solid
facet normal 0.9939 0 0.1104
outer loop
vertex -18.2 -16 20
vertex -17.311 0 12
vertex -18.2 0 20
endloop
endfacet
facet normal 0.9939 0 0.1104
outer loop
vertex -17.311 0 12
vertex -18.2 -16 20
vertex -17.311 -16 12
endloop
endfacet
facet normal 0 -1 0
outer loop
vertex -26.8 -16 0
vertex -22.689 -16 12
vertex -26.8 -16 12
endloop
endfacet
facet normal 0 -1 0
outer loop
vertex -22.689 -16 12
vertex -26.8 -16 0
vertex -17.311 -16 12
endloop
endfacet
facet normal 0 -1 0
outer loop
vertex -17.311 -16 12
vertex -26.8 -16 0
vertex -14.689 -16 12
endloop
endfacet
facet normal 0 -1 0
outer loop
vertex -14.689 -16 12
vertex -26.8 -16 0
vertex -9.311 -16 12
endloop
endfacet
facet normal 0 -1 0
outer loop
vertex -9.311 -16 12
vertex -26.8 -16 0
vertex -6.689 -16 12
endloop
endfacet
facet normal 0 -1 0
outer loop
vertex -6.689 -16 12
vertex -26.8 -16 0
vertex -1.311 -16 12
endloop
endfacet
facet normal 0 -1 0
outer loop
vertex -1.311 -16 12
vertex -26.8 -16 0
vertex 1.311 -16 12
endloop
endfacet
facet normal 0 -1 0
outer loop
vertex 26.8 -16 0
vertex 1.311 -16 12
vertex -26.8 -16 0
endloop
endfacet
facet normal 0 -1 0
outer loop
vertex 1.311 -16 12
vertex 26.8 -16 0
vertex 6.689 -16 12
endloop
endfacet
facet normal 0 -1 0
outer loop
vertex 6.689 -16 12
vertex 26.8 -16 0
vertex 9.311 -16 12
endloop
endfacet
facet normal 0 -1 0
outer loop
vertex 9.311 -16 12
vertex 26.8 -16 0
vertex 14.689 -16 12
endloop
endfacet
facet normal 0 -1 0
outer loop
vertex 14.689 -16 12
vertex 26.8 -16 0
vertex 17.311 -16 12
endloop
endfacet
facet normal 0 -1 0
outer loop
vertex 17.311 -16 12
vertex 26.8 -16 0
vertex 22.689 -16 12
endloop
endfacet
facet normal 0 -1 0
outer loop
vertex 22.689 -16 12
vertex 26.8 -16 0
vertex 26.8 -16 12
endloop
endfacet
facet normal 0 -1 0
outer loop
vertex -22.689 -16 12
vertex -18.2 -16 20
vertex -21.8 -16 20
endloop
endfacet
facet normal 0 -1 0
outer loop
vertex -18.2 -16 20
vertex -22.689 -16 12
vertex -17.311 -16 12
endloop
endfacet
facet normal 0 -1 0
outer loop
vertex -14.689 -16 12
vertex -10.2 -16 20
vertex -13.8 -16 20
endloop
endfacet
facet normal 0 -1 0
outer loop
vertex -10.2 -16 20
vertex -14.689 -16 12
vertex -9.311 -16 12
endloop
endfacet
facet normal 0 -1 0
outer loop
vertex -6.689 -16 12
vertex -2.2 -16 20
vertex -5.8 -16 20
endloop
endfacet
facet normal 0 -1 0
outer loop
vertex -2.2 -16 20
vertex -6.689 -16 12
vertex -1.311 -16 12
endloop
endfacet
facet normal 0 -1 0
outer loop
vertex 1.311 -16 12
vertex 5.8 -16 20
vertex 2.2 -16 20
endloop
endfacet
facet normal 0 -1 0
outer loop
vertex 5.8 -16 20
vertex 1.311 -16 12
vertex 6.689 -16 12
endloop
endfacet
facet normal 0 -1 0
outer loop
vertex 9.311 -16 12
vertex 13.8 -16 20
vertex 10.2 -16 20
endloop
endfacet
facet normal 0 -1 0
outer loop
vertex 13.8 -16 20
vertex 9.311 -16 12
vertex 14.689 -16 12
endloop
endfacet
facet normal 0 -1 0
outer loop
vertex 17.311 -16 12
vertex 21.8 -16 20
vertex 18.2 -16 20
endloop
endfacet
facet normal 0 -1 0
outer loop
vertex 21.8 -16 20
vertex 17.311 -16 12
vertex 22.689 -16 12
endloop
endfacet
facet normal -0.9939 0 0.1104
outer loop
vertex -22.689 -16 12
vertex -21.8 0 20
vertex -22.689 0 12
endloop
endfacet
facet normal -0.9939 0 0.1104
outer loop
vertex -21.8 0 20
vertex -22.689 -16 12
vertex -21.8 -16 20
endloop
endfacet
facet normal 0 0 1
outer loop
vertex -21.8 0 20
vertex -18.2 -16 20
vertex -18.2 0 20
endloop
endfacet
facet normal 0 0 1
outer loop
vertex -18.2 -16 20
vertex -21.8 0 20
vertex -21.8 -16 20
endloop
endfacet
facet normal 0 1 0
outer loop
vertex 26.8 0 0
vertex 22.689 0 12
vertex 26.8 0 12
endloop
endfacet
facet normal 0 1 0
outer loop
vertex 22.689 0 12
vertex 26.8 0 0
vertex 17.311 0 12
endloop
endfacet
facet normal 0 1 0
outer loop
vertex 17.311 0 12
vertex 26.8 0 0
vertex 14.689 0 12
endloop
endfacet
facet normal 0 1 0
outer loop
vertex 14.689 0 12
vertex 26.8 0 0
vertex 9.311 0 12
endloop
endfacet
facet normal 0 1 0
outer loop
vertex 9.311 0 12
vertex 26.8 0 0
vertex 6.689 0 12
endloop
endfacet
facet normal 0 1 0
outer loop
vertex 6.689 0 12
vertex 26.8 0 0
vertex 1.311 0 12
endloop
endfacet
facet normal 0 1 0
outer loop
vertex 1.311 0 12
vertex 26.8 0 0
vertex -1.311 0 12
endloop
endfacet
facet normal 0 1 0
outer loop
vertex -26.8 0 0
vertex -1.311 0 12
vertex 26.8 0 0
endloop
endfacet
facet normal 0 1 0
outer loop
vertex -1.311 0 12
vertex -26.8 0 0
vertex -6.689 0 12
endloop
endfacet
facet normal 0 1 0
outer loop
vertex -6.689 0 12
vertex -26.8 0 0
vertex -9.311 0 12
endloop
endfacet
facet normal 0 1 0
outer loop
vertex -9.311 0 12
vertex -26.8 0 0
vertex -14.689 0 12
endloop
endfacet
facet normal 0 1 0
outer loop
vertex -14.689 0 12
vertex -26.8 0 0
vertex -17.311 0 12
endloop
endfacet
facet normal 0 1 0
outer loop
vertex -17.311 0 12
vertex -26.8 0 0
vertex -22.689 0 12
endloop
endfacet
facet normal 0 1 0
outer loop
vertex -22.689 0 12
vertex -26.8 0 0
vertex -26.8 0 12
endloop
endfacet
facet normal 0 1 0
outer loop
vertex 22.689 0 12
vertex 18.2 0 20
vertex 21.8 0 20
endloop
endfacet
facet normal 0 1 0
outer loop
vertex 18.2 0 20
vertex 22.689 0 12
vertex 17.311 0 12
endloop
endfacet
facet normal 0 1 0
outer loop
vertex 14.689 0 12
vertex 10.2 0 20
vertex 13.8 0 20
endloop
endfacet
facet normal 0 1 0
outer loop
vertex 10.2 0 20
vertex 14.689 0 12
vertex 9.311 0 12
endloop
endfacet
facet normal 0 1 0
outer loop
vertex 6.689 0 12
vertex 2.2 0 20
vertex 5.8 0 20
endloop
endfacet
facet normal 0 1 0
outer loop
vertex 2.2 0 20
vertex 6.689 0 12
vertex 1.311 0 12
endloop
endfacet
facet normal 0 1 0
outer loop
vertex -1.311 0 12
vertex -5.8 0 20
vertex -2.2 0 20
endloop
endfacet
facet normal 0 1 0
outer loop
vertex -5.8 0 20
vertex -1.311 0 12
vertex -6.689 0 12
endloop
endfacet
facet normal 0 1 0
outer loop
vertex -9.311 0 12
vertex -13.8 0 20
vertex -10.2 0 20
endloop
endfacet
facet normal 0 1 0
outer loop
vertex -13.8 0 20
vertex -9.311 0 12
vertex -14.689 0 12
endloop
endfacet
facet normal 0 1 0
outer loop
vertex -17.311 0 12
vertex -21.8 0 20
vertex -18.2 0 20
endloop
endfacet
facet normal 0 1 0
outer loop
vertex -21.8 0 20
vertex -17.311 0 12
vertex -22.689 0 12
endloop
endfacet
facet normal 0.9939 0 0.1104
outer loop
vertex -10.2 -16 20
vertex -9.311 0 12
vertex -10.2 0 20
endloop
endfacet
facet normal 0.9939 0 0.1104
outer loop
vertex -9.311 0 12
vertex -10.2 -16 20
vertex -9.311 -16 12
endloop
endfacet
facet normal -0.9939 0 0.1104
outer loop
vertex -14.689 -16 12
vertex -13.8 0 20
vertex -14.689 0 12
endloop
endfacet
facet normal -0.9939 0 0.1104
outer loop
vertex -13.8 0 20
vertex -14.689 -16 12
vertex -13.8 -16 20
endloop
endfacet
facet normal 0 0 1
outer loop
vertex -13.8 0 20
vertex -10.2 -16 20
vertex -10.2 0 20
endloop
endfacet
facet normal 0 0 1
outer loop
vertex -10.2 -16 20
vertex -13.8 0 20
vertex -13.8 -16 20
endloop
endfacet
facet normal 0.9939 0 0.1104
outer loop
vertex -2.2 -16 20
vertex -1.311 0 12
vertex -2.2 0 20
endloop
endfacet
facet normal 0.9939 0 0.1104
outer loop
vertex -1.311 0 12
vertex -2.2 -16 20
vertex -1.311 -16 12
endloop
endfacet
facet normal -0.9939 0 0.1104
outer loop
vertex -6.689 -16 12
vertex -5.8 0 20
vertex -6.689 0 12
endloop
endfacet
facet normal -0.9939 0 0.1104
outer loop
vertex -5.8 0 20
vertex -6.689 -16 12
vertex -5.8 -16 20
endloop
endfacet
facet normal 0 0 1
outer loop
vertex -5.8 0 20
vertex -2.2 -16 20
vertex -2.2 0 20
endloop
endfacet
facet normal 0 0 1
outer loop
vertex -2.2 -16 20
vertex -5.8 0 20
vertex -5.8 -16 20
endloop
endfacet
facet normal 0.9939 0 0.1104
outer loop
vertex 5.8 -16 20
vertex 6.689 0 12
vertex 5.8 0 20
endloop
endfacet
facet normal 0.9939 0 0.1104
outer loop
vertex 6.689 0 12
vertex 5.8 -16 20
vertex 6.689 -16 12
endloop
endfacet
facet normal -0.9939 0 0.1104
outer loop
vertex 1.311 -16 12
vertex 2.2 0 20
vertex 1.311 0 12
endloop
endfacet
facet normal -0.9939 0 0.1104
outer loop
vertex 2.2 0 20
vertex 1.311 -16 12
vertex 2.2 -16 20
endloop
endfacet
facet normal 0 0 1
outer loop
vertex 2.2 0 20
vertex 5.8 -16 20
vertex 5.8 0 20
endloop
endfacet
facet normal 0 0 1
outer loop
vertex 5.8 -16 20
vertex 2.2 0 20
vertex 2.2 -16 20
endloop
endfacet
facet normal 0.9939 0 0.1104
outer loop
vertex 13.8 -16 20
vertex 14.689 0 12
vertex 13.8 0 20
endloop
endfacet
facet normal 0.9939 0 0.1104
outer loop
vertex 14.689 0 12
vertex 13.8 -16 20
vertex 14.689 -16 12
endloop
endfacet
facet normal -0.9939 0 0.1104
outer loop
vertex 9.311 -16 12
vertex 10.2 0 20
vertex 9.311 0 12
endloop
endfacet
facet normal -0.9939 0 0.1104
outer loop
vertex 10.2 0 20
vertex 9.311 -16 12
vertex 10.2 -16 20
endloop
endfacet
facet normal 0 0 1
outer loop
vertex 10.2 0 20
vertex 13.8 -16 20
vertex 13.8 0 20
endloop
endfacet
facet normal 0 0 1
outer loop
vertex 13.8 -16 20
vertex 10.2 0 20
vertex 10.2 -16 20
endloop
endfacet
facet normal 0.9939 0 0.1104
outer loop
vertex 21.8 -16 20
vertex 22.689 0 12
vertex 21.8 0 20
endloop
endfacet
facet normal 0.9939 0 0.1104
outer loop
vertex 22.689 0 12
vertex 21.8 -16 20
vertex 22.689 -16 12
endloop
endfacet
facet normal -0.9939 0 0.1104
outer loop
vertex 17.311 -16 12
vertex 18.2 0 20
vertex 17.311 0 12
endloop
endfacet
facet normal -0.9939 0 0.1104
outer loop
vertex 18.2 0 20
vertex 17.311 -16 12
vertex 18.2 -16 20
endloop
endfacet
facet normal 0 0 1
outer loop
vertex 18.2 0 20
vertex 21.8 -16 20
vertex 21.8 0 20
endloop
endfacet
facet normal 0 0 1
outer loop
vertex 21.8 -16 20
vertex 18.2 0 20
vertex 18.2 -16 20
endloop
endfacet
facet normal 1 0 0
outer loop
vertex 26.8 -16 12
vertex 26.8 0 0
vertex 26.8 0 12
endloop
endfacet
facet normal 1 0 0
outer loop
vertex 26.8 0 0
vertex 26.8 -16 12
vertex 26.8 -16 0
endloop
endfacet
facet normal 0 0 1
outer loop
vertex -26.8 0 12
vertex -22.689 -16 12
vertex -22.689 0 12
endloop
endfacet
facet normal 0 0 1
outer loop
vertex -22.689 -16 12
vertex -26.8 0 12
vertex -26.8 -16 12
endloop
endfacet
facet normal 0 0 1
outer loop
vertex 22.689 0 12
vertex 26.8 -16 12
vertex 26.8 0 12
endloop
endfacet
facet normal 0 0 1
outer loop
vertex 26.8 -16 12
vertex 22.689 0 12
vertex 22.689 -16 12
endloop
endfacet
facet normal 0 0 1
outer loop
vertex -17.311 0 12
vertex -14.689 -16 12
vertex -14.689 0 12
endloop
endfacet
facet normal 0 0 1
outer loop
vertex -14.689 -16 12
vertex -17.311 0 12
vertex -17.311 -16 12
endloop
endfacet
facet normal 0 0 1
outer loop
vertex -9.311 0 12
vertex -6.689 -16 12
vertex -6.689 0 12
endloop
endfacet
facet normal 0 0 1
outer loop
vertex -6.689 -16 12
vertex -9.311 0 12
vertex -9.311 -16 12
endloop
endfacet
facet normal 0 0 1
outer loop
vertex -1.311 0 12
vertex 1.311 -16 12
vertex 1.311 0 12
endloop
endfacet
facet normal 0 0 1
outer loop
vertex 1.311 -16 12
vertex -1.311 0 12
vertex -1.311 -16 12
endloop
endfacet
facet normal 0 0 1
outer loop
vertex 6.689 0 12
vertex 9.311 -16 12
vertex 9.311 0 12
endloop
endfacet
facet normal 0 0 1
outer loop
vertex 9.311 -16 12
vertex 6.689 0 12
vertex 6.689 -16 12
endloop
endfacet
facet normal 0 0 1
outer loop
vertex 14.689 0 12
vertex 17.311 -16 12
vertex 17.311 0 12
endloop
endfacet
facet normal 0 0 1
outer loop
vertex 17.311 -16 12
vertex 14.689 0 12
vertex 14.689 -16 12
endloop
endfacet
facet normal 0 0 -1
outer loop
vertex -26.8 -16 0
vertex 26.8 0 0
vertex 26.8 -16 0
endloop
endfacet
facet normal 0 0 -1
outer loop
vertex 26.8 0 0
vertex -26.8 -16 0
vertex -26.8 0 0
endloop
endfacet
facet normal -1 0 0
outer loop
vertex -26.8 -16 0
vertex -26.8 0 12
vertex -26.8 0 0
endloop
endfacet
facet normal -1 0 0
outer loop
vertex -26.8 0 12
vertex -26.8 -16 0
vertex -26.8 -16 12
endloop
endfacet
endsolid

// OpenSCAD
$fn = 32;

// ----------------------------------------------------------------------
// Toothed rack, 6 teeth
// 8 mm pitch, 8 mm teeth
// ----------------------------------------------------------------------

// --- parameters (mm) ---
bar_w = 16;     // bar width (Y)
bar_h = 12;     // bar height (Z)
teeth = 6;      // number of teeth
pitch = 8;      // tooth pitch
tooth_h = 8;    // tooth height above the bar
root_w = 5.6;   // tooth width at the root
crest_w = 3.6;  // tooth width at the crest

// --- derived feature positions (mm) ---
span = (teeth - 1) * pitch;  // = 40   distance between the outer teeth
bar_l = span + root_w + 8;   // = 53.6   bar length: teeth plus 4 mm at each end
tooth_x = -span / 2;         // = -20   X of the first tooth
height = bar_h + tooth_h;    // = 20   overall height
feature_centers = [
  [tooth_x + 0 * pitch, -bar_w / 2],
  [tooth_x + 1 * pitch, -bar_w / 2],
  [tooth_x + 2 * pitch, -bar_w / 2],
  [tooth_x + 3 * pitch, -bar_w / 2],
  [tooth_x + 4 * pitch, -bar_w / 2],
  [tooth_x + 5 * pitch, -bar_w / 2]
];   // tooth centre line, drives the tooth loop

// bar with a rack of teeth, one extruded trapezoium per centre
module rack_tooth() {
  linear_extrude(height = bar_w)
    polygon(points = [
      [0, 0],
      [root_w, 0],
      [root_w / 2 + crest_w / 2, tooth_h + 1],
      [root_w / 2 - crest_w / 2, tooth_h + 1]
    ]);
}

union() {
  translate([-bar_l / 2, -bar_w, 0]) cube([bar_l, bar_w, bar_h]);
  for (centre = feature_centers)
    translate([centre[0] - root_w / 2, 0, bar_h - 1]) rotate([90, 0, 0]) rack_tooth();
}
